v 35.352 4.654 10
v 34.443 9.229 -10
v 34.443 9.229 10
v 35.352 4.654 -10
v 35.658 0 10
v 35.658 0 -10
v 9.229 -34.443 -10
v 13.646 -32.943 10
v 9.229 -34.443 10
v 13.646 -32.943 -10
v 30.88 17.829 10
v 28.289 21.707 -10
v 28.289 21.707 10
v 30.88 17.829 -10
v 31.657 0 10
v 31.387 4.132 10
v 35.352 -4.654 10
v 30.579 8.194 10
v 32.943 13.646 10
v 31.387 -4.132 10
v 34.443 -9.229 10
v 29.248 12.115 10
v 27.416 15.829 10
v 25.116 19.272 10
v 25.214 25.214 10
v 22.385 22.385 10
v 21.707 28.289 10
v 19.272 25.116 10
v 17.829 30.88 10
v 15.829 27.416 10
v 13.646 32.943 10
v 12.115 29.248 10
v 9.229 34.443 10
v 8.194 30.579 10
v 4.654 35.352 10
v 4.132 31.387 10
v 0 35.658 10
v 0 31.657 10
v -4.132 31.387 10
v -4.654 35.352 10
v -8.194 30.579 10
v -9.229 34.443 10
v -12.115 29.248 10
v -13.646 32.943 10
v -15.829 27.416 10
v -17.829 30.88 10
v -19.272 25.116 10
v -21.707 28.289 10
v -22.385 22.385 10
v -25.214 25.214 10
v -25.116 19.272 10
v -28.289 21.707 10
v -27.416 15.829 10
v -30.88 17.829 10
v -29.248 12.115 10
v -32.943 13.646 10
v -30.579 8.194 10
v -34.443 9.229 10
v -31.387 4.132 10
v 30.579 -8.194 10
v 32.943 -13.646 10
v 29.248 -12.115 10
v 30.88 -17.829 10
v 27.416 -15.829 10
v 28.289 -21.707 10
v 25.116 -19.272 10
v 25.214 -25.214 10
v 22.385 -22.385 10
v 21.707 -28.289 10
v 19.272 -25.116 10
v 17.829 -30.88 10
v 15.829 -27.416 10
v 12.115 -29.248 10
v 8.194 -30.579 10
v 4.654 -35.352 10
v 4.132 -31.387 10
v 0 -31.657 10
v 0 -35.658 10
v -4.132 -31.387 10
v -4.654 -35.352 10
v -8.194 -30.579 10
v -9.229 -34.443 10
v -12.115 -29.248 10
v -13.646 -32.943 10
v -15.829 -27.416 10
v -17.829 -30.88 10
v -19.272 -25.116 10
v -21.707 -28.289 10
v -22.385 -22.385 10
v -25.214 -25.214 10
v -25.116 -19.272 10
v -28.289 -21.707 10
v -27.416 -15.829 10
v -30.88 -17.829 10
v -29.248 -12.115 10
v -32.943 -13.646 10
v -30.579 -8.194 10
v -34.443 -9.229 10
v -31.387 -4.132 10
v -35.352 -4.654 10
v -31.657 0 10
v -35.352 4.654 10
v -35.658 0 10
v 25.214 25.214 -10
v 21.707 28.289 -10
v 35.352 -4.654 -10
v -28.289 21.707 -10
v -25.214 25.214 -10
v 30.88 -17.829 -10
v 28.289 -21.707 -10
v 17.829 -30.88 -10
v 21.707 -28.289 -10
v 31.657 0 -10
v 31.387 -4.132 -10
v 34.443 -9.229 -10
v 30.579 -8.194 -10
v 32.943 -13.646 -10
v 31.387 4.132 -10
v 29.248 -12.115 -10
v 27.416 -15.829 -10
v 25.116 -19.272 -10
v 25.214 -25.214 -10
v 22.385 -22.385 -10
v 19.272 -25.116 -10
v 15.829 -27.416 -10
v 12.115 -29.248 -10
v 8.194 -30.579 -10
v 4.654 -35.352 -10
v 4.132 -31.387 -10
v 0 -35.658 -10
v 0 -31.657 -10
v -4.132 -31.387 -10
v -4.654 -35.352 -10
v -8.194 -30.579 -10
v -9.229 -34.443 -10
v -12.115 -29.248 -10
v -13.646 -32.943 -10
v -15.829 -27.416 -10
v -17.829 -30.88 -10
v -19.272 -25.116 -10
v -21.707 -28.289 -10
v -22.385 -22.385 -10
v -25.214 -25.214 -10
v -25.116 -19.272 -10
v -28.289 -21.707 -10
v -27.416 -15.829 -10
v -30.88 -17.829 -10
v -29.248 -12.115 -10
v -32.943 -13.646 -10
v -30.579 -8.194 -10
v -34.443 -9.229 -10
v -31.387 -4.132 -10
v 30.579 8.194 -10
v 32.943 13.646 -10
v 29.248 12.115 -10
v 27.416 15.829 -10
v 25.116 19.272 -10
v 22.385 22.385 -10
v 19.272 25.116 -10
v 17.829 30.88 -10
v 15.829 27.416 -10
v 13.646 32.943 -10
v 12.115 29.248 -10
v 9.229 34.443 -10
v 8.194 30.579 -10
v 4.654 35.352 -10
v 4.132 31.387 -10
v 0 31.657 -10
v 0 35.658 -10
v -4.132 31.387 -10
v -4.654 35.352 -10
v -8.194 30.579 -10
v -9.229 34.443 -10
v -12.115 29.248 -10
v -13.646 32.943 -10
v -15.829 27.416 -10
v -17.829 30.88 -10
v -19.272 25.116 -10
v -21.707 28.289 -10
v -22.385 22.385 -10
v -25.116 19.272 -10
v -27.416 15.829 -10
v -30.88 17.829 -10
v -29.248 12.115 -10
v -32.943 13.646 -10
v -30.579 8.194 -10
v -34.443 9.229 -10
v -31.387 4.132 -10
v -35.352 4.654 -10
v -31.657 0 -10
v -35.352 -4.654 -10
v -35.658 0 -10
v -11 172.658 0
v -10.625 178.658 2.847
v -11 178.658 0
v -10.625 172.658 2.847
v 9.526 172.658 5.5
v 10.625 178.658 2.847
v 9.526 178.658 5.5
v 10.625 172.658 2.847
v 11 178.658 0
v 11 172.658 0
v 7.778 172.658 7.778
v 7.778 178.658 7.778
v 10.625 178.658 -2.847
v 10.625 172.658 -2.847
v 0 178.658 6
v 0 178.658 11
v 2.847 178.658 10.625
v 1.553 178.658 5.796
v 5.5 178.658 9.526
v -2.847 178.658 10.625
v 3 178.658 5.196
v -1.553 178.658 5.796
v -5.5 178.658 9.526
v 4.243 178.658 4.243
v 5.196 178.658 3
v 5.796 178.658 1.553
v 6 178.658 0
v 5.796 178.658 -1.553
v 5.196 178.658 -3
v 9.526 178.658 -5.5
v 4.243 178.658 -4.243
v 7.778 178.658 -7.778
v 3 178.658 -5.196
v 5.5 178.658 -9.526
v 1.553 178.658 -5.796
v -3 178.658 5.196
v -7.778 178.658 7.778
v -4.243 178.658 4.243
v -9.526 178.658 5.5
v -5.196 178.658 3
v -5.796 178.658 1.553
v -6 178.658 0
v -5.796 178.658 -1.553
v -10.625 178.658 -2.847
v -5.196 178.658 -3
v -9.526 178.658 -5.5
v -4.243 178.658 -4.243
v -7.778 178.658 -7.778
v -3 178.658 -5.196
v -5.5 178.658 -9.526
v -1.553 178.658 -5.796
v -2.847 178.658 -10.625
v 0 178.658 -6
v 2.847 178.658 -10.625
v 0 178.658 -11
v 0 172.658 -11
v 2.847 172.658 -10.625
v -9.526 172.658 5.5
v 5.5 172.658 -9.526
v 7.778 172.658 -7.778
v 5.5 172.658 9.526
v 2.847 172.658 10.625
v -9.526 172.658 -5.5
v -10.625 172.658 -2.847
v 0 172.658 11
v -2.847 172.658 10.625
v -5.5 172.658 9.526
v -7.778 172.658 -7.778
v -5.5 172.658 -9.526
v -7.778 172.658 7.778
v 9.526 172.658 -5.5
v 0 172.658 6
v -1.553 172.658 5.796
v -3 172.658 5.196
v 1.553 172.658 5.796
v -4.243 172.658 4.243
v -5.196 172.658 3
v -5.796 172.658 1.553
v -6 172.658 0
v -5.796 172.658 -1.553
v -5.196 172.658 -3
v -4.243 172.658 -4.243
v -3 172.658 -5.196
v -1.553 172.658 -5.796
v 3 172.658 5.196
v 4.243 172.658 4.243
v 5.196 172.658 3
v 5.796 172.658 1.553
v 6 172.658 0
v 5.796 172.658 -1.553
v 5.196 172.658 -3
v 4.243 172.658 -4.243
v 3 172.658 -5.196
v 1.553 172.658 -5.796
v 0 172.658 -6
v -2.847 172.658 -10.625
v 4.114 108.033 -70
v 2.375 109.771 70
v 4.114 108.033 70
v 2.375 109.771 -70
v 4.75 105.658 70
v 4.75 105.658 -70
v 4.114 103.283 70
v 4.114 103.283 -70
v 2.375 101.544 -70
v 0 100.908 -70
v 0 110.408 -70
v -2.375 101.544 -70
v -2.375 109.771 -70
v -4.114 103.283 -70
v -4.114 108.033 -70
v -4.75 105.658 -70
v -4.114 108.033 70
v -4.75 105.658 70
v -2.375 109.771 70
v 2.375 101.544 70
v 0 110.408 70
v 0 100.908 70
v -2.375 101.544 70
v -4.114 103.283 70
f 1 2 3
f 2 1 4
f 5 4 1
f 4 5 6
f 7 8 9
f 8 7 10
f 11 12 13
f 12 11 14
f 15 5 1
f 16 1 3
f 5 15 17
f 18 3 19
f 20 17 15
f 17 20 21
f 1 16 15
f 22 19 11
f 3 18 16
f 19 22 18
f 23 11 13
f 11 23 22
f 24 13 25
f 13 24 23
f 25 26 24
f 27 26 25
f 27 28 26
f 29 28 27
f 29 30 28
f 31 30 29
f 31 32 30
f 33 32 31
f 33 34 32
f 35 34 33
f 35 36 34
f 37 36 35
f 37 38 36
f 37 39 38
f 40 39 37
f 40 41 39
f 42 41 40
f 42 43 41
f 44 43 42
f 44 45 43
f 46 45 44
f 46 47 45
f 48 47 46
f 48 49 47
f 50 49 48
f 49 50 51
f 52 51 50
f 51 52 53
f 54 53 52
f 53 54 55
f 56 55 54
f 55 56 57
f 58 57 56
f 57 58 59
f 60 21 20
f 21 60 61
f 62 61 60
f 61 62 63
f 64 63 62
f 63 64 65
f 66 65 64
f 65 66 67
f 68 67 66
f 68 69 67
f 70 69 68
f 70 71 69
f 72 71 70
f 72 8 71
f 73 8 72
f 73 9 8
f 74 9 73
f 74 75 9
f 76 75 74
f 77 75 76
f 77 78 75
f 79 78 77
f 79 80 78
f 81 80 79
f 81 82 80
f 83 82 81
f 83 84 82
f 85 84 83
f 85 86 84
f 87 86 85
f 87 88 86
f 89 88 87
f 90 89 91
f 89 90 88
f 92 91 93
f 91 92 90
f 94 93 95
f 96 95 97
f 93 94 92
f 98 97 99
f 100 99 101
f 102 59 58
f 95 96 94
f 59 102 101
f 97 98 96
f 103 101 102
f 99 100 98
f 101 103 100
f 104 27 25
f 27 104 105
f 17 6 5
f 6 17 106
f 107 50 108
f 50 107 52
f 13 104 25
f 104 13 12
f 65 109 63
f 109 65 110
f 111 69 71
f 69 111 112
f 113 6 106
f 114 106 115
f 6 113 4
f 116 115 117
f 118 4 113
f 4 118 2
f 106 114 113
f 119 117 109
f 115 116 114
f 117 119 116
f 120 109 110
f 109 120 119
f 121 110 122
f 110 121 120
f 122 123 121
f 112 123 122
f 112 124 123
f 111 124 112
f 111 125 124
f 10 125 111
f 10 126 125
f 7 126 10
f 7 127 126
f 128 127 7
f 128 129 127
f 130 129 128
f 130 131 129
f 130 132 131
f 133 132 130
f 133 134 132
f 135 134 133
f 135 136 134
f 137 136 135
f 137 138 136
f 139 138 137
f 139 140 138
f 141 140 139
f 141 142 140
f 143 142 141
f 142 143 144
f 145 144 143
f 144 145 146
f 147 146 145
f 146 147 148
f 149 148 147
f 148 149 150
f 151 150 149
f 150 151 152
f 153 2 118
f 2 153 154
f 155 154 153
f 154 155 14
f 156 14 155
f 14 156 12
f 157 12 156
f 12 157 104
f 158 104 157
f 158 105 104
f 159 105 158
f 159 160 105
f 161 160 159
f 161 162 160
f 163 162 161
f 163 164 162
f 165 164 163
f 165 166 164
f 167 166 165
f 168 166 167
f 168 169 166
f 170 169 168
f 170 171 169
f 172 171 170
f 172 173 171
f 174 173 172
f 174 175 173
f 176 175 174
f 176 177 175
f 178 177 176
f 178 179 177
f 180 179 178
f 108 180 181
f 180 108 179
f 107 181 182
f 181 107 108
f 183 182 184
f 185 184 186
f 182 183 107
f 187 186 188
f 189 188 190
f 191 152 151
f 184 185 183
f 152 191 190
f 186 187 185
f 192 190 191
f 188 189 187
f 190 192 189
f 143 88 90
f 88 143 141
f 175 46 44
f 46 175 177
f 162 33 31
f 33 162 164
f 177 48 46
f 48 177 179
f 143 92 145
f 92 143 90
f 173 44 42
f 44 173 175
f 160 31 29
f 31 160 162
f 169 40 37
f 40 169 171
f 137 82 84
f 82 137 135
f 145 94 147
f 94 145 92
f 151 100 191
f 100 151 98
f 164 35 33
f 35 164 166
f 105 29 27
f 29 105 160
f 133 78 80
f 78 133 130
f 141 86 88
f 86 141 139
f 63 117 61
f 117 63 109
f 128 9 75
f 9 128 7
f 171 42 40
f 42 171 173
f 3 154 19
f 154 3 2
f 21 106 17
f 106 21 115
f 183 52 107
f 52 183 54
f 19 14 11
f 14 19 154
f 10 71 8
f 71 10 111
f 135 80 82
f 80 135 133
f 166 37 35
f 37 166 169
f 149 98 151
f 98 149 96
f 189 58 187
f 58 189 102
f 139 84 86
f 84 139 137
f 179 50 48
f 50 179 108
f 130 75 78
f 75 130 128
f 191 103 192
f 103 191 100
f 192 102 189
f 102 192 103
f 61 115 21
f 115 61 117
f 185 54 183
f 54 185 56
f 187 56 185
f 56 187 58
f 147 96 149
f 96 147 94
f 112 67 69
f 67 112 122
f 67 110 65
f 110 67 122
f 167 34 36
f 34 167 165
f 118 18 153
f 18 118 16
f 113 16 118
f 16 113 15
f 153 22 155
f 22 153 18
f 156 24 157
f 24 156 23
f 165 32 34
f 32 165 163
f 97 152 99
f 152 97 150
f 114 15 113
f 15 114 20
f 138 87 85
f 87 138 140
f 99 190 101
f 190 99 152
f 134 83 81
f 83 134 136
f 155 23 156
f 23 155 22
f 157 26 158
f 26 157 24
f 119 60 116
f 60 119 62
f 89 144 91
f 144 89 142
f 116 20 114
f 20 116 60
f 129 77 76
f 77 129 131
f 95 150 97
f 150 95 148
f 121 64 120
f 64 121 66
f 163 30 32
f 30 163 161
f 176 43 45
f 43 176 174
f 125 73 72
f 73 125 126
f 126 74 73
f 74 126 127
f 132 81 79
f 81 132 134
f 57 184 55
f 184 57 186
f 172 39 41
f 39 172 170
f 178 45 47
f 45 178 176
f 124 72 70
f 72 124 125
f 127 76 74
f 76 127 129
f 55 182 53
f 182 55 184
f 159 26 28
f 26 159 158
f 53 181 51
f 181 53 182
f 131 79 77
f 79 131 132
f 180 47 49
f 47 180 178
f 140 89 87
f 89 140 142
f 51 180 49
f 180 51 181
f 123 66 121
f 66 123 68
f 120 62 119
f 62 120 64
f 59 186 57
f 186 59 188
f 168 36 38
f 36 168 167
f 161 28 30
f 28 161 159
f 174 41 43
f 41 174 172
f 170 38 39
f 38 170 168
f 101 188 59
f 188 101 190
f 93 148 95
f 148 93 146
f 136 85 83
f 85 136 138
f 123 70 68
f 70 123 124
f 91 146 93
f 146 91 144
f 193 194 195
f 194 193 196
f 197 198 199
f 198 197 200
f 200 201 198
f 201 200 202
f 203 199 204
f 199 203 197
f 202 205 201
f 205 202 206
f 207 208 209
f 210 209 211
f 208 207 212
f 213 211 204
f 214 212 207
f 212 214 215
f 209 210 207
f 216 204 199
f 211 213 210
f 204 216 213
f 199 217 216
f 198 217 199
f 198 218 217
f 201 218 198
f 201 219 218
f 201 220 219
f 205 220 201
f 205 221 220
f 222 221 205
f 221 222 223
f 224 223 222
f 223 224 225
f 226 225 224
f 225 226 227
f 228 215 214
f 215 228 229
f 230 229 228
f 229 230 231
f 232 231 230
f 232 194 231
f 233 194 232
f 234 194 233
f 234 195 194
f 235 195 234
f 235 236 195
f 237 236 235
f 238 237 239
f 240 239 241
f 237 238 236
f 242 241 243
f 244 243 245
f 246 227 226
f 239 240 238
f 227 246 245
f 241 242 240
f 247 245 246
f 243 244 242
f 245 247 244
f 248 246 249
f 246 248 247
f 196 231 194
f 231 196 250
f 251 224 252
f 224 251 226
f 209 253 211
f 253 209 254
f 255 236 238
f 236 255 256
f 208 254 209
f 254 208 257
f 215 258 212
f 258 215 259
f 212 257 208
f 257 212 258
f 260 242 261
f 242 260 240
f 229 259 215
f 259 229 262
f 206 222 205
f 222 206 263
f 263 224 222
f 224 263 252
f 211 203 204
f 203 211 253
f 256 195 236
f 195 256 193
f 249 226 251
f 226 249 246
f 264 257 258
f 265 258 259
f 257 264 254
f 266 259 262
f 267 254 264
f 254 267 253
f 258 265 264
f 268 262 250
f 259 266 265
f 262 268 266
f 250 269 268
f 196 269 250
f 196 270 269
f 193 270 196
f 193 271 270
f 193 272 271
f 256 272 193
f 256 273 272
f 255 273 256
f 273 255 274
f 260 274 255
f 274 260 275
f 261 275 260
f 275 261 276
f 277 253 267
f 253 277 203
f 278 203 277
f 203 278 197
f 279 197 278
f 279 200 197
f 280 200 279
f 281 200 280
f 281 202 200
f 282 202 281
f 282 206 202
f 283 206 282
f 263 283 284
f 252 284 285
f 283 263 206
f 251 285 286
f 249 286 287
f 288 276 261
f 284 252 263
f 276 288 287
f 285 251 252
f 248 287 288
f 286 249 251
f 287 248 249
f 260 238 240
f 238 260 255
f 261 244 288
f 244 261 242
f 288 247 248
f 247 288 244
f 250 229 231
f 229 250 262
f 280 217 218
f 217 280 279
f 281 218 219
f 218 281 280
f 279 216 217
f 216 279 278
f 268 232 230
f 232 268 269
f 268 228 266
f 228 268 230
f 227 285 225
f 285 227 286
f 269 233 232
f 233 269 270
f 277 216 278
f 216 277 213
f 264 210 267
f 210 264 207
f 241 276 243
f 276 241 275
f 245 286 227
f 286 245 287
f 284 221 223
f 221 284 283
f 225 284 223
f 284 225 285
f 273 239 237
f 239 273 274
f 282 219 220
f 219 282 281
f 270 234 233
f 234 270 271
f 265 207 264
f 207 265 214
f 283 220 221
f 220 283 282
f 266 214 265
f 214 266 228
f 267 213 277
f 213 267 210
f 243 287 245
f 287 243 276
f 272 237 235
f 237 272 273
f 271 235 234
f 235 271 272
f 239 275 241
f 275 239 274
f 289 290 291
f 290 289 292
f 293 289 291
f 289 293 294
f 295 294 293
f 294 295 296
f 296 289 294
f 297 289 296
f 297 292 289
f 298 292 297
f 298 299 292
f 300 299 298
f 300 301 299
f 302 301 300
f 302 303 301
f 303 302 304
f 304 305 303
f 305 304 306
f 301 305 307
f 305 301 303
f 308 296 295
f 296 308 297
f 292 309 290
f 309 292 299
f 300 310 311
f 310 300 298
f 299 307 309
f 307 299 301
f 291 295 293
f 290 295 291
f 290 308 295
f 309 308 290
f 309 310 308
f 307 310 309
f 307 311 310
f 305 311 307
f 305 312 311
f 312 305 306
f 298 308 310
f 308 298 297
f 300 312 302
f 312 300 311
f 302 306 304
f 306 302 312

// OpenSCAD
// Auto-generated by scripts/author_from_manifest.py (Phase D.3).
// Source: data/phase_d_manifest.json (sku_intent='anvil-fig1000-sway-brace-longitudinal').
// Do not hand-edit — regenerate from the manifest.
//
// @part anvil_fig1000_sway_brace_longitudinal
// @kind hanger
// @category brace.longitudinal
// @display-name "Anvil FIG 1000 Seismic Sway Brace — Longitudinal"
// @mfg anvil_international
// @mfg-pn FIG_1000_LG
// @listing UL
// @price-usd 42.00
// @install-minutes 15
// @crew journeyman
// @param size_in number default=2 label="Size" unit="in"
// @port pipe position=[0,0,0] direction=[0,1,0] style=grooved size_in=2 role=run_a

size_in = 2.0;

function od_mm(nps) =
    nps ==   1  ? 33.4 :
    nps == 1.25 ? 42.2 :
    nps == 1.5  ? 48.3 :
    nps ==   2  ? 60.3 :
    nps == 2.5  ? 73.0 :
    nps ==   3  ? 88.9 :
    nps ==   4  ? 114.3 :
    nps ==   6  ? 168.3 :
    nps ==   8  ? 219.1 : 60.3;

od = od_mm(size_in);
ring_id = od * 1.05;
ring_od = ring_id + 8;
strap_w = 20;
rod_len = 140;

union() {
    // Ring
    difference() {
        cylinder(h = strap_w, d = ring_od, center = true, $fn = 48);
        cylinder(h = strap_w + 1, d = ring_id, center = true, $fn = 48);
    }
    // Rod up +Y
    translate([0, rod_len/2 + ring_od/2, 0])
        cylinder(h = rod_len, d = 9.5, center = true, $fn = 12);
    // Top swivel eye
    translate([0, rod_len + ring_od/2, 0])
        rotate([90, 0, 0])
        difference() {
            cylinder(h = 6, d = 22, center = true, $fn = 24);
            cylinder(h = 8, d = 12, center = true, $fn = 24);
        }
}
